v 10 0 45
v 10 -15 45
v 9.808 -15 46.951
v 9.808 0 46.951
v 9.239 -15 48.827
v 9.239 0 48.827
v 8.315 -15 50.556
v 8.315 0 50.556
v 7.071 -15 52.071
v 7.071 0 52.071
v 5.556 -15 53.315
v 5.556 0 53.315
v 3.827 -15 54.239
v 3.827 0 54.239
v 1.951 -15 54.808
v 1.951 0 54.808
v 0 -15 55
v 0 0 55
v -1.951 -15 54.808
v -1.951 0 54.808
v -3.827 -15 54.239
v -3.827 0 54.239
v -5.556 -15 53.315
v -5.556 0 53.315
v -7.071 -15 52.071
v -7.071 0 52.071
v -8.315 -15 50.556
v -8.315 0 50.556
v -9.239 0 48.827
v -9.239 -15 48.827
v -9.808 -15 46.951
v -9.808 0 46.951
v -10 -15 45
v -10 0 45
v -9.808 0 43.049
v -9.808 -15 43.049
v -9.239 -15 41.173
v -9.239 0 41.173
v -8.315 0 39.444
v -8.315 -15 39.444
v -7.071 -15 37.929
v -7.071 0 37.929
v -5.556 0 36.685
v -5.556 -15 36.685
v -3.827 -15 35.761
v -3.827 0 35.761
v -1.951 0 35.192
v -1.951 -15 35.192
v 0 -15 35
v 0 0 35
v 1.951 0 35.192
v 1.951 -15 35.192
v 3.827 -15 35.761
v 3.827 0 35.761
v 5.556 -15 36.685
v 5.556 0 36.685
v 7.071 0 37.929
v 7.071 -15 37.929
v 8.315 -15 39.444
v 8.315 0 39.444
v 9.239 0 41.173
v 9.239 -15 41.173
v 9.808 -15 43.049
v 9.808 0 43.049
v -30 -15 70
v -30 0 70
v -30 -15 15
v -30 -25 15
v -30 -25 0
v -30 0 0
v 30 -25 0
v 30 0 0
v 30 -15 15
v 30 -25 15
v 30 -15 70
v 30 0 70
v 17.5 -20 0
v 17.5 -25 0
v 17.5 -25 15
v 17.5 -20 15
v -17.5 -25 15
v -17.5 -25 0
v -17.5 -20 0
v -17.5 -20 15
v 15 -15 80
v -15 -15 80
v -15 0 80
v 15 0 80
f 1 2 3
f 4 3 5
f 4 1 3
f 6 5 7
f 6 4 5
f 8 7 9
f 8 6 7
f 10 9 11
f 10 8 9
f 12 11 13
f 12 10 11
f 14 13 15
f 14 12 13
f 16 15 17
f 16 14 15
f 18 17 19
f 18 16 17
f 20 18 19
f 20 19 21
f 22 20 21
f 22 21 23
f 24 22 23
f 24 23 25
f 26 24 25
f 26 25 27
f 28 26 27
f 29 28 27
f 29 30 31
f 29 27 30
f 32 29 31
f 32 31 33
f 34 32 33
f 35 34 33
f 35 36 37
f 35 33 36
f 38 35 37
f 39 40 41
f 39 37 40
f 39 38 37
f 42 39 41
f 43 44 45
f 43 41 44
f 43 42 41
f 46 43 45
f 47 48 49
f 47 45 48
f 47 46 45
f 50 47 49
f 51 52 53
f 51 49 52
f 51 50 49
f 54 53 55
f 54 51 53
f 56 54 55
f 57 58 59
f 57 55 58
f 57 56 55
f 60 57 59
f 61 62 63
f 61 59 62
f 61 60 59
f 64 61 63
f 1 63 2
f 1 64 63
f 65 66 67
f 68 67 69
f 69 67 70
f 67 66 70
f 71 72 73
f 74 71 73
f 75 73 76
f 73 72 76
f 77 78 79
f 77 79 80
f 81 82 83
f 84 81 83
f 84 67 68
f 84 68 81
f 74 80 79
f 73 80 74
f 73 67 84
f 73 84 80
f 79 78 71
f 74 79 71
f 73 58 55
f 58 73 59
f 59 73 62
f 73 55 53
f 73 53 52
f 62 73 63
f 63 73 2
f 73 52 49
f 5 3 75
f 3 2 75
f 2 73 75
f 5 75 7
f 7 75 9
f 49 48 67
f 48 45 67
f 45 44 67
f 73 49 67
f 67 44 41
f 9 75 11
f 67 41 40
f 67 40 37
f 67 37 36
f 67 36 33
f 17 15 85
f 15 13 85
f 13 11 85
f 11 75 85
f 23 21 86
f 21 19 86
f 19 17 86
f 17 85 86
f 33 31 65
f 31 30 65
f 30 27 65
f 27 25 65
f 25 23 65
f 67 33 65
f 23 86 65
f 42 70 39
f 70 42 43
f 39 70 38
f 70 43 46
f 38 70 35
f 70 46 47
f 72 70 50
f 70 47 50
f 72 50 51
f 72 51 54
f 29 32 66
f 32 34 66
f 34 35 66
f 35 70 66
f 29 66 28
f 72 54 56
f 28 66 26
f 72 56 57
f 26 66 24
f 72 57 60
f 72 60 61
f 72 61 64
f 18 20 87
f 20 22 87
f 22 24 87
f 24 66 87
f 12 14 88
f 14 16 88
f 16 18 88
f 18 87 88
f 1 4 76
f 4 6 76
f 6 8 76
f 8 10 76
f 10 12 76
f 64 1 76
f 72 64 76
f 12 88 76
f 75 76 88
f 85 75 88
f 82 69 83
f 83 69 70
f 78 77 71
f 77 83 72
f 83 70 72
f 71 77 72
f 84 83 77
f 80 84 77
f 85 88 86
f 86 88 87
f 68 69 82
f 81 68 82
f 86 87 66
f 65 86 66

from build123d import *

# Parameters (mm, degrees)
F0_R     = 10
F1_DEPTH = 25
F3_DEPTH = 65
F4_W     = 35
F4_H     = 5
F5_DEPTH = 15


with BuildPart() as f1:
    # F0 (on Front) → F1 (new body)
    with BuildSketch(Plane.XZ):
        Polygon((-30, 0), (30, 0), (30, 70), (15, 80), (-15, 80), (-30, 70), align=None)
        with Locations((0, 45)):
            Circle(F0_R, mode=Mode.SUBTRACT)
    extrude(amount=F1_DEPTH)

    # F2 (on face) → F3 (cut)
    with BuildSketch(Plane.XY.offset(80)):
        Polygon((-30, -25), (-15, -25), (30, -25), (30, -15), (-30, -15), align=None)
    extrude(amount=-F3_DEPTH, mode=Mode.SUBTRACT)

    # F4 (on Top) → F5 (cut)
    with BuildSketch(Plane.XY):
        with Locations((0, -22.5)):
            Rectangle(F4_W, F4_H)
    extrude(amount=F5_DEPTH, mode=Mode.SUBTRACT)


solid = f1.part
